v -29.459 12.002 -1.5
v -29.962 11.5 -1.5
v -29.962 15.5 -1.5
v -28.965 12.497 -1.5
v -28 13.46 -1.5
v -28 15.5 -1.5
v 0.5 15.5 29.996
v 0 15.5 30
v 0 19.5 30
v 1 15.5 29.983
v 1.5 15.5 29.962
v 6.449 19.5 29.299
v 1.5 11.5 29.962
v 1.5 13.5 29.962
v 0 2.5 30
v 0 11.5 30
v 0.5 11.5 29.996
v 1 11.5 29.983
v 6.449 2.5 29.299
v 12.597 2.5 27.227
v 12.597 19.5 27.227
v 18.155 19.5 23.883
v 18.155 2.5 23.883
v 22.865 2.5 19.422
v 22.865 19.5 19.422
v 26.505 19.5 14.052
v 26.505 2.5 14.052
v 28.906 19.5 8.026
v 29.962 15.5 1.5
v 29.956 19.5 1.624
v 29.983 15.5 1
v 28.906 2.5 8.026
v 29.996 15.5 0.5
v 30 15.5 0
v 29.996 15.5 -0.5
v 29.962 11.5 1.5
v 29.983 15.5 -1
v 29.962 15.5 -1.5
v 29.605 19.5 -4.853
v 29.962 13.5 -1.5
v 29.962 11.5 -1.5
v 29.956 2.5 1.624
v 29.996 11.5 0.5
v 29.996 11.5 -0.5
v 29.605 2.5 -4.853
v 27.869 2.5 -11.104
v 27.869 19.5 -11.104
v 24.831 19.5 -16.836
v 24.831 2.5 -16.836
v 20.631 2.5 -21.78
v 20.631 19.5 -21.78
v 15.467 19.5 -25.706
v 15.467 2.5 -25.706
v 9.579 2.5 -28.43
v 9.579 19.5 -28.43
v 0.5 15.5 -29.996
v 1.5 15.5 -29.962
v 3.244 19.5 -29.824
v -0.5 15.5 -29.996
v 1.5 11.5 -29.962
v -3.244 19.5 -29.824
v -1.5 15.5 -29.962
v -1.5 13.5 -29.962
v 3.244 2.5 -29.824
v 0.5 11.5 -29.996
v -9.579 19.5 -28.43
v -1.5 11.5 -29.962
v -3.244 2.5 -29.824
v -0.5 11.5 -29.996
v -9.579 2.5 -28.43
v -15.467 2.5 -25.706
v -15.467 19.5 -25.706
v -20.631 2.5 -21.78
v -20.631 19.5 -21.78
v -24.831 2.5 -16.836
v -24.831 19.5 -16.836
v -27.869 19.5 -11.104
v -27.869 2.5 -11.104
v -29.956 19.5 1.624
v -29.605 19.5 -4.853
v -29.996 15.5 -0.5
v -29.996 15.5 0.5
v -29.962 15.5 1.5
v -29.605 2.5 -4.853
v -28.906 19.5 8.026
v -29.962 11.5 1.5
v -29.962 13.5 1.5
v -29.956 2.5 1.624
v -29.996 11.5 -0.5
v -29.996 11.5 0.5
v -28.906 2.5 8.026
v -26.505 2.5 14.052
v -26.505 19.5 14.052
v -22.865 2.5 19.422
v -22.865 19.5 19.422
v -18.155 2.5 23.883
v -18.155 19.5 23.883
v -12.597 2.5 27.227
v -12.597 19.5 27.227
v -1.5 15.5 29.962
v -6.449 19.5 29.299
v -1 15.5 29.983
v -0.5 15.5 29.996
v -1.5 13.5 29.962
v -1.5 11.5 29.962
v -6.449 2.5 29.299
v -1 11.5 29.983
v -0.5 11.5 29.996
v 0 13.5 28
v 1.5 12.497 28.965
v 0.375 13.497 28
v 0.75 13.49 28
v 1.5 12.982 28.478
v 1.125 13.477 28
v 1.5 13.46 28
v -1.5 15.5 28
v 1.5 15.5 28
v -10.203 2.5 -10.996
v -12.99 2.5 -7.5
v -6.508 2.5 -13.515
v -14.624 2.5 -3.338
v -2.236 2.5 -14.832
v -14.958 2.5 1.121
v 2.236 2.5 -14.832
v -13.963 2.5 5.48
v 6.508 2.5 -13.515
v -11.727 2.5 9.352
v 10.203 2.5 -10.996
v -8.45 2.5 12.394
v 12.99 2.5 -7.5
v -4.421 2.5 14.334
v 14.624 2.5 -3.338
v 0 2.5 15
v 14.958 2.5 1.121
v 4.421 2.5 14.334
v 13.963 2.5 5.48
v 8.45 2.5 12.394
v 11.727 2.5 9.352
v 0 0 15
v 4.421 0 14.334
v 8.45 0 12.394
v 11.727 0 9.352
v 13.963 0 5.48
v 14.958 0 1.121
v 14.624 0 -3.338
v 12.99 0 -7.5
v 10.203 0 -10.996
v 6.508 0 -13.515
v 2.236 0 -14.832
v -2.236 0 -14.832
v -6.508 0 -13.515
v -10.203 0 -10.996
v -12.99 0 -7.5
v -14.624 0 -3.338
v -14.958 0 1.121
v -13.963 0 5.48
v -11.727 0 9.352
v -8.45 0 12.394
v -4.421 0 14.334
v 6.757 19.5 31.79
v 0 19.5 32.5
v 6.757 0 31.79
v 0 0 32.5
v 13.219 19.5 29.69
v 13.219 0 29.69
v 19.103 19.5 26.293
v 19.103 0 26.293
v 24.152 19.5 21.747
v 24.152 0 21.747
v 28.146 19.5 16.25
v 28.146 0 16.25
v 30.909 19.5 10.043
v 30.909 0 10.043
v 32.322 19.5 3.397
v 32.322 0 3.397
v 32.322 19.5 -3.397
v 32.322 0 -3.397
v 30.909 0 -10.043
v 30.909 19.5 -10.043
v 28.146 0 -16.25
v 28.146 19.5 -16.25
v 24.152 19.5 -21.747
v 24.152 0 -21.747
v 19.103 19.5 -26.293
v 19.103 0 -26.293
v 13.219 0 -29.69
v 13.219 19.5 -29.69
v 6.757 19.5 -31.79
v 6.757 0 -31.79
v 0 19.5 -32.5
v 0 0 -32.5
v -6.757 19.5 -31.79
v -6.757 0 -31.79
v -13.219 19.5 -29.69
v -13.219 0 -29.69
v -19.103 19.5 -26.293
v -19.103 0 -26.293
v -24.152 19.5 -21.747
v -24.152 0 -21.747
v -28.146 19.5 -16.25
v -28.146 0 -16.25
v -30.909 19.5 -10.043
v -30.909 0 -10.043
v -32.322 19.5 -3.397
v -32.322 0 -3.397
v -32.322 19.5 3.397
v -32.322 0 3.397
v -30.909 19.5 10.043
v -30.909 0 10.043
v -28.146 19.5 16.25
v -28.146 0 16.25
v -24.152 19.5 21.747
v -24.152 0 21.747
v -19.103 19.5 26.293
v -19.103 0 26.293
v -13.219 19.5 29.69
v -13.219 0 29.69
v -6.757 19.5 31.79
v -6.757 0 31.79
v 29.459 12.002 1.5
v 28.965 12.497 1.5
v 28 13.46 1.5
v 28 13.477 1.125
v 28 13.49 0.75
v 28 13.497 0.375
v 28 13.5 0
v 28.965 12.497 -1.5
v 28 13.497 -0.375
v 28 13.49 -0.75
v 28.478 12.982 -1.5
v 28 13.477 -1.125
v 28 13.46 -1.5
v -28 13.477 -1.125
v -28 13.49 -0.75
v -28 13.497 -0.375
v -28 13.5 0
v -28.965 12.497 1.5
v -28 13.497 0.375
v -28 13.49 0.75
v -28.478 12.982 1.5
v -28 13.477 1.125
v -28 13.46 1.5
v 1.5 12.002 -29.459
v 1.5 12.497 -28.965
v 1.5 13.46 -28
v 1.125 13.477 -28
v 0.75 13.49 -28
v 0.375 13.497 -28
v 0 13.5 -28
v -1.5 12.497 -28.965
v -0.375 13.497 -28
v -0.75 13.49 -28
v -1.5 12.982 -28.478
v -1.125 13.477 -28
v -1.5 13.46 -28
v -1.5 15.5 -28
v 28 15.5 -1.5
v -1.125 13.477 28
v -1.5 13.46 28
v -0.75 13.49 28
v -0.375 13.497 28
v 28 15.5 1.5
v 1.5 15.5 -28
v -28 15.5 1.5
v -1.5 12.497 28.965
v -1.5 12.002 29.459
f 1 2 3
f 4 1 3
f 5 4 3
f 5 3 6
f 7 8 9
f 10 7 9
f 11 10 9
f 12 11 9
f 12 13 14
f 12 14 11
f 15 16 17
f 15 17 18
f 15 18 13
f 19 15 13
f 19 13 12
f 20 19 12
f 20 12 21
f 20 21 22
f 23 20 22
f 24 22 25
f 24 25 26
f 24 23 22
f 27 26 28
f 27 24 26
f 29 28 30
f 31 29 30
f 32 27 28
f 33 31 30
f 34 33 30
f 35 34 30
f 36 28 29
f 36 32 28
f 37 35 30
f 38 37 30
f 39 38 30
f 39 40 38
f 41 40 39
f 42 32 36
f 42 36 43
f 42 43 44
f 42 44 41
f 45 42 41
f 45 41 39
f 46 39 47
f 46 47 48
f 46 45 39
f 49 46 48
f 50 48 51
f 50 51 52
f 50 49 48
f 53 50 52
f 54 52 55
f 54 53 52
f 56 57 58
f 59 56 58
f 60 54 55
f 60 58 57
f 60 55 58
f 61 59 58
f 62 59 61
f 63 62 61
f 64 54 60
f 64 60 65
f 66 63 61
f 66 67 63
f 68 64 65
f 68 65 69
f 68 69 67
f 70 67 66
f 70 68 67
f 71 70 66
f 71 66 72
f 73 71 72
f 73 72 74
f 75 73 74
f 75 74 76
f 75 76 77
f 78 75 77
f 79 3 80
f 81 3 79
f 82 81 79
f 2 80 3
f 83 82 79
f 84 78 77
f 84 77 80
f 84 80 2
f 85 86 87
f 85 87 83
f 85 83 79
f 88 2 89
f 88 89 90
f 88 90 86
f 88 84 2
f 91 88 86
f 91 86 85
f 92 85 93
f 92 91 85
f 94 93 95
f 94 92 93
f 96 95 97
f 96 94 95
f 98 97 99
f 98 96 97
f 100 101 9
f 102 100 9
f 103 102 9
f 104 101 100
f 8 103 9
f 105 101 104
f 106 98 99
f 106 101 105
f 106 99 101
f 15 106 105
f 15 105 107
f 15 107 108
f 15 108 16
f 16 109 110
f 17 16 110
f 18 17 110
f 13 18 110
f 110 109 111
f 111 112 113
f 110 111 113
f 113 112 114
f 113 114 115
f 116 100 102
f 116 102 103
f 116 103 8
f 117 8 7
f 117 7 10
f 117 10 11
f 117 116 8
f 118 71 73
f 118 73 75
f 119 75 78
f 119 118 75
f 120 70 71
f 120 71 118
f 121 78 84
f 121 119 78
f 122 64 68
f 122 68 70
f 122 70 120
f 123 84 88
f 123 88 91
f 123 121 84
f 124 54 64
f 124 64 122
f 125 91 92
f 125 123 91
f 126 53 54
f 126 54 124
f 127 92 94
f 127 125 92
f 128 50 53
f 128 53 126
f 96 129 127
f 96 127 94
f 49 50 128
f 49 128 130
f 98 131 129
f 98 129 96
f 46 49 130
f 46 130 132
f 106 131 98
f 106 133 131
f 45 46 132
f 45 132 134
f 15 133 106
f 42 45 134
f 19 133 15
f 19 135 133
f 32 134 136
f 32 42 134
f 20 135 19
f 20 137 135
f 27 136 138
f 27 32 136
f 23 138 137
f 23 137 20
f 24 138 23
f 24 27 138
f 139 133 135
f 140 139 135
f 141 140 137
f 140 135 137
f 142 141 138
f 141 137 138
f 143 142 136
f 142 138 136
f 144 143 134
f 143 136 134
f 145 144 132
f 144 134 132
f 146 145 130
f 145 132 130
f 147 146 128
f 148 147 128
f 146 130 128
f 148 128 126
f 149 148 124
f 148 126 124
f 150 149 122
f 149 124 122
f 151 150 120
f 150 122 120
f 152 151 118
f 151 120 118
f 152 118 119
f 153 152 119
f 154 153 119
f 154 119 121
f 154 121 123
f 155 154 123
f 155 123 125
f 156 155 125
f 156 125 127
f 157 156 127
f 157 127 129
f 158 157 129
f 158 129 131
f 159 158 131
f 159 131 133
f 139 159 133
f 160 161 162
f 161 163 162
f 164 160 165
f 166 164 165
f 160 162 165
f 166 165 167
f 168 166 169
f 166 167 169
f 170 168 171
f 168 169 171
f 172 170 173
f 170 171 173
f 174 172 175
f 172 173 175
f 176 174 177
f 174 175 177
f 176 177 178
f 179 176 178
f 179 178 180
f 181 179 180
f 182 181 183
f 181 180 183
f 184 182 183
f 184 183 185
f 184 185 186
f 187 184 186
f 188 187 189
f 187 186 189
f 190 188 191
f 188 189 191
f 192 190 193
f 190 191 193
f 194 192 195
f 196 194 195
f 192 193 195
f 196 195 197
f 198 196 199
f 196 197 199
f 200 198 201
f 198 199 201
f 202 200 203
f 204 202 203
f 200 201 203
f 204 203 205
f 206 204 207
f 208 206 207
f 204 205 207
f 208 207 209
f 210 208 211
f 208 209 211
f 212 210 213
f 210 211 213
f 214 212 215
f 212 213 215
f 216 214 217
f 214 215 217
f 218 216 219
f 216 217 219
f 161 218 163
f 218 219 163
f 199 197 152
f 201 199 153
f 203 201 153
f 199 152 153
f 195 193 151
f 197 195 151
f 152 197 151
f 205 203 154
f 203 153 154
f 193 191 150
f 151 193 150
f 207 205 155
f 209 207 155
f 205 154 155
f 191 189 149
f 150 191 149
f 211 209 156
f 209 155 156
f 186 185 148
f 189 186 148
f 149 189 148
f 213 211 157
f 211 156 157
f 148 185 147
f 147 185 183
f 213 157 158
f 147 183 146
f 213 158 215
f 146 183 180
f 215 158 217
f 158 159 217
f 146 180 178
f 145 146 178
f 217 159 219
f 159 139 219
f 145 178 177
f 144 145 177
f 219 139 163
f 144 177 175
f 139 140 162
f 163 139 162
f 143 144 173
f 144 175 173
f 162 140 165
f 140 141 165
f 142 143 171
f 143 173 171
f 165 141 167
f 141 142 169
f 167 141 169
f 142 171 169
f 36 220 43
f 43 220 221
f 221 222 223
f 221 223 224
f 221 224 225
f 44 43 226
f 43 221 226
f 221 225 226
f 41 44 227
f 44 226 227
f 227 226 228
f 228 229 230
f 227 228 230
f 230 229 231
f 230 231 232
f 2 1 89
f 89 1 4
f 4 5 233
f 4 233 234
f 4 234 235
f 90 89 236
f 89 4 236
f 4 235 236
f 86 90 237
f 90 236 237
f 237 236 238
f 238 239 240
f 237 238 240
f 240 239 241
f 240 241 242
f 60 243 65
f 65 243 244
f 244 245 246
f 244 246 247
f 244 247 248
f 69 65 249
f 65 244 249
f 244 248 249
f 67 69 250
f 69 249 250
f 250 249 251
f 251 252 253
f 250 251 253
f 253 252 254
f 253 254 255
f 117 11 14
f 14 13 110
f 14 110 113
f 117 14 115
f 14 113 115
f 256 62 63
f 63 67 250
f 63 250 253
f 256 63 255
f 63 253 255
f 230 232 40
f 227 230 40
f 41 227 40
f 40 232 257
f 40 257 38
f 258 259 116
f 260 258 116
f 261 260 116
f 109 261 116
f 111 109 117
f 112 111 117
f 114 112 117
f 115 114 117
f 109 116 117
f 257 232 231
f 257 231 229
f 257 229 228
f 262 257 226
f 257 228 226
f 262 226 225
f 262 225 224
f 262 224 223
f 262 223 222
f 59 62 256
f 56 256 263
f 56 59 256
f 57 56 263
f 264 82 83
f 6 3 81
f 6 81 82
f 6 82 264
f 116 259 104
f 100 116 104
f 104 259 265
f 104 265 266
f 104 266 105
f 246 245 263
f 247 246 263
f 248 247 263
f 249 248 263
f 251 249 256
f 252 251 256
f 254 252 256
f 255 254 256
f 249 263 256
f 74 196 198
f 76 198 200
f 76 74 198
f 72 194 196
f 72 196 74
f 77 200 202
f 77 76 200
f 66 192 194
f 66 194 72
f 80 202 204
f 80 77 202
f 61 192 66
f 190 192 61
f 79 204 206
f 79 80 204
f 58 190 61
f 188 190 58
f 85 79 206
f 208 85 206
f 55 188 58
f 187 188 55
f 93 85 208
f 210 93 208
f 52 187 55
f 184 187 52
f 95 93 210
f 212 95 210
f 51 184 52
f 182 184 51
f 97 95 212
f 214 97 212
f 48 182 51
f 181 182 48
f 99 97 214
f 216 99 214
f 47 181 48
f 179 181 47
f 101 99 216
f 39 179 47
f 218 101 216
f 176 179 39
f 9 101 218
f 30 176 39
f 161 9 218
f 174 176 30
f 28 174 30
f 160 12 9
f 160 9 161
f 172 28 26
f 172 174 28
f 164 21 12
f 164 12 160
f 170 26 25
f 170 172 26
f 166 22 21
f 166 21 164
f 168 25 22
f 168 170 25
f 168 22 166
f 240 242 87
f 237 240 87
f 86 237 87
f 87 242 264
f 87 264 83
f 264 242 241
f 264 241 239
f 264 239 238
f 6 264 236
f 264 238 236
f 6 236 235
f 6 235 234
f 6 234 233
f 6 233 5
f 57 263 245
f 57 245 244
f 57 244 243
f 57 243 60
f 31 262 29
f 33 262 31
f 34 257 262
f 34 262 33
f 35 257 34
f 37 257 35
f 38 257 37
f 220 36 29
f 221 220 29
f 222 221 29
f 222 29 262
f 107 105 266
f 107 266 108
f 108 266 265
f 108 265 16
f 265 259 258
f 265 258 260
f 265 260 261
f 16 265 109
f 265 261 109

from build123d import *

# Parameters (mm, degrees)
SKETCH1_R           = 32.5
BOSS_EXTRUDE1_DEPTH = 2.5
SKETCH2_R           = 32.5
SKETCH2_R_2         = 30
BOSS_EXTRUDE2_DEPTH = 17
BOSS_EXTRUDE3_START = -2
BOSS_EXTRUDE3_DEPTH = 2
CHAMFER1_SIZE       = 2
SKETCH4_R           = 15
CUT_EXTRUDE1_DEPTH  = 50.005101775


with BuildPart() as part:
    # Sketch1 → Boss-Extrude1 (new body)
    with BuildSketch(Plane(origin=(0, 0, 0), x_dir=(1, 0, 0), z_dir=(0, 1, 0))):
        with Locations(Location((0, 0, 0), (0, 0, 270))):
            Circle(SKETCH1_R)
    extrude(amount=BOSS_EXTRUDE1_DEPTH)

    # Sketch2 → Boss-Extrude2 (add)
    with BuildSketch(Plane(origin=(0, 2.5, 0), x_dir=(1, 0, 0), z_dir=(0, 1, 0))):
        with Locations(Location((0, 0, 0), (0, 0, 270))):
            Circle(SKETCH2_R)
        with Locations(Location((0, 0, 0), (0, 0, 270))):
            Circle(SKETCH2_R_2, mode=Mode.SUBTRACT)
    extrude(amount=BOSS_EXTRUDE2_DEPTH)

    # Sketch3 → Boss-Extrude3 (add)
    with BuildSketch(Plane(origin=(0, 15.5, 0), x_dir=(1, 0, 0), z_dir=(0, 1, 0)).offset(BOSS_EXTRUDE3_START)):
        with BuildLine():
            Line((-1.5, 28), (1.5, 28))
            Line((1.5, 28), (1.5, 29.962476533))
            ThreePointArc((1.5, 29.962476533), (0, 30), (-1.5, 29.962476533))
            Line((-1.5, 29.962476533), (-1.5, 28))
        make_face()
        with BuildLine():
            Line((-28, 1.5), (-29.962476533, 1.5))
            ThreePointArc((-29.962476533, 1.5), (-30, 0), (-29.962476533, -1.5))
            Line((-29.962476533, -1.5), (-28, -1.5))
            Line((-28, -1.5), (-28, 1.5))
        make_face()
        with BuildLine():
            ThreePointArc((30, 0), (29.990617666, 0.750234632), (29.962476533, 1.5))
            Line((29.962476533, 1.5), (28, 1.5))
            Line((28, 1.5), (28, -1.5))
            Line((28, -1.5), (29.962476533, -1.5))
            ThreePointArc((29.962476533, -1.5), (29.990617666, -0.750234632), (30, 0))
        make_face()
        with BuildLine():
            ThreePointArc((-1.5, -29.962476533), (0, -30), (1.5, -29.962476533))
            Line((1.5, -29.962476533), (1.5, -28))
            Line((1.5, -28), (-1.5, -28))
            Line((-1.5, -28), (-1.5, -29.962476533))
        make_face()
    extrude(amount=BOSS_EXTRUDE3_DEPTH)

    # Chamfer1
    # the kernel refuses this chamfer: 2 mm, written as the material it adds along each edge
    with BuildSketch(Plane(origin=(0, 13.5, 0), x_dir=(0, 0, 1), z_dir=(-1, 0, 0))) as chamfer1_piece_1_section:
        Polygon((30, -CHAMFER1_SIZE), (30 - CHAMFER1_SIZE, 0), (30, 0), align=None)
    chamfer1_piece_1 = revolve(axis=Axis((0, 13.5, 0), (0, 1, 0)), revolution_arc=12.689093413, mode=Mode.PRIVATE)
    chamfer1_piece_1 = split(chamfer1_piece_1, bisect_by=Plane(origin=(1.5, 12.838755732, 29.330774017), z_dir=(-1, 0, 0)), keep=Keep.TOP, mode=Mode.PRIVATE)
    chamfer1_piece_1 = split(chamfer1_piece_1, bisect_by=Plane(origin=(0.749919513, 12.838755732, 28), z_dir=(0, 0, 1)), keep=Keep.TOP, mode=Mode.PRIVATE)
    add(chamfer1_piece_1)
    with BuildSketch(Plane(origin=(0, 13.5, 0), x_dir=(0.9755763292717098, 0, 0.21966070600982865), z_dir=(-0.21966070600982865, 0, 0.9755763292717098))) as chamfer1_piece_2_section:
        Polygon((30, -CHAMFER1_SIZE), (30 - CHAMFER1_SIZE, 0), (30, 0), align=None)
    chamfer1_piece_2 = revolve(axis=Axis((0, 13.5, 0), (0, 1, 0)), revolution_arc=25.378210829, mode=Mode.PRIVATE)
    chamfer1_piece_2 = split(chamfer1_piece_2, bisect_by=Plane(origin=(29.330774007, 12.838755737, 1.5), z_dir=(0, 0, -1)), keep=Keep.TOP, mode=Mode.PRIVATE)
    chamfer1_piece_2 = split(chamfer1_piece_2, bisect_by=Plane(origin=(29.330774007, 12.838755737, -1.5), z_dir=(0, 0, 1)), keep=Keep.TOP, mode=Mode.PRIVATE)
    chamfer1_piece_2 = split(chamfer1_piece_2, bisect_by=Plane(origin=(28, 12.838755737, 0), z_dir=(1, 0, 0)), keep=Keep.TOP, mode=Mode.PRIVATE)
    add(chamfer1_piece_2)
    with BuildSketch(Plane(origin=(0, 13.5, 0), x_dir=(0.21966070600991422, 0, -0.9755763292716906), z_dir=(0.9755763292716906, 0, 0.21966070600991422))) as chamfer1_piece_3_section:
        Polygon((30, -CHAMFER1_SIZE), (30 - CHAMFER1_SIZE, 0), (30, 0), align=None)
    chamfer1_piece_3 = revolve(axis=Axis((0, 13.5, 0), (0, 1, 0)), revolution_arc=25.378210829, mode=Mode.PRIVATE)
    chamfer1_piece_3 = split(chamfer1_piece_3, bisect_by=Plane(origin=(1.5, 12.838755737, -29.330774007), z_dir=(-1, 0, 0)), keep=Keep.TOP, mode=Mode.PRIVATE)
    chamfer1_piece_3 = split(chamfer1_piece_3, bisect_by=Plane(origin=(-1.5, 12.838755737, -29.330774007), z_dir=(1, 0, 0)), keep=Keep.TOP, mode=Mode.PRIVATE)
    chamfer1_piece_3 = split(chamfer1_piece_3, bisect_by=Plane(origin=(0, 12.838755737, -28), z_dir=(0, 0, -1)), keep=Keep.TOP, mode=Mode.PRIVATE)
    add(chamfer1_piece_3)
    with BuildSketch(Plane(origin=(0, 13.5, 0), x_dir=(-0.9755763292716926, 0, -0.21966070600990492), z_dir=(0.21966070600990492, 0, -0.9755763292716926))) as chamfer1_piece_4_section:
        Polygon((30, -CHAMFER1_SIZE), (30 - CHAMFER1_SIZE, 0), (30, 0), align=None)
    chamfer1_piece_4 = revolve(axis=Axis((0, 13.5, 0), (0, 1, 0)), revolution_arc=25.378210829, mode=Mode.PRIVATE)
    chamfer1_piece_4 = split(chamfer1_piece_4, bisect_by=Plane(origin=(-29.330774007, 12.838755737, -1.5), z_dir=(0, 0, 1)), keep=Keep.TOP, mode=Mode.PRIVATE)
    chamfer1_piece_4 = split(chamfer1_piece_4, bisect_by=Plane(origin=(-29.330774007, 12.838755737, 1.5), z_dir=(0, 0, -1)), keep=Keep.TOP, mode=Mode.PRIVATE)
    chamfer1_piece_4 = split(chamfer1_piece_4, bisect_by=Plane(origin=(-28, 12.838755737, 0), z_dir=(-1, 0, 0)), keep=Keep.TOP, mode=Mode.PRIVATE)
    add(chamfer1_piece_4)
    with BuildSketch(Plane(origin=(0, 13.5, 0), x_dir=(-0.2196605016666056, 0, 0.9755763752815949), z_dir=(-0.9755763752815949, 0, -0.2196605016666056))) as chamfer1_piece_5_section:
        Polygon((30, -CHAMFER1_SIZE), (30 - CHAMFER1_SIZE, 0), (30, 0), align=None)
    chamfer1_piece_5 = revolve(axis=Axis((0, 13.5, 0), (0, 1, 0)), revolution_arc=12.689093413, mode=Mode.PRIVATE)
    chamfer1_piece_5 = split(chamfer1_piece_5, bisect_by=Plane(origin=(-1.5, 12.838755737, 29.330774007), z_dir=(1, 0, 0)), keep=Keep.TOP, mode=Mode.PRIVATE)
    chamfer1_piece_5 = split(chamfer1_piece_5, bisect_by=Plane(origin=(-0.749919511, 12.838755737, 28), z_dir=(0, 0, 1)), keep=Keep.TOP, mode=Mode.PRIVATE)
    add(chamfer1_piece_5)

    # Sketch4 → Cut-Extrude1 (cut, through all)
    with BuildSketch(Plane(origin=(0, 2.5, 0), x_dir=(1, 0, 0), z_dir=(0, 1, 0))):
        with Locations(Location((0, 0, 0), (0, 0, 270))):
            Circle(SKETCH4_R)
    extrude(amount=-CUT_EXTRUDE1_DEPTH, mode=Mode.SUBTRACT)


solid = part.part
